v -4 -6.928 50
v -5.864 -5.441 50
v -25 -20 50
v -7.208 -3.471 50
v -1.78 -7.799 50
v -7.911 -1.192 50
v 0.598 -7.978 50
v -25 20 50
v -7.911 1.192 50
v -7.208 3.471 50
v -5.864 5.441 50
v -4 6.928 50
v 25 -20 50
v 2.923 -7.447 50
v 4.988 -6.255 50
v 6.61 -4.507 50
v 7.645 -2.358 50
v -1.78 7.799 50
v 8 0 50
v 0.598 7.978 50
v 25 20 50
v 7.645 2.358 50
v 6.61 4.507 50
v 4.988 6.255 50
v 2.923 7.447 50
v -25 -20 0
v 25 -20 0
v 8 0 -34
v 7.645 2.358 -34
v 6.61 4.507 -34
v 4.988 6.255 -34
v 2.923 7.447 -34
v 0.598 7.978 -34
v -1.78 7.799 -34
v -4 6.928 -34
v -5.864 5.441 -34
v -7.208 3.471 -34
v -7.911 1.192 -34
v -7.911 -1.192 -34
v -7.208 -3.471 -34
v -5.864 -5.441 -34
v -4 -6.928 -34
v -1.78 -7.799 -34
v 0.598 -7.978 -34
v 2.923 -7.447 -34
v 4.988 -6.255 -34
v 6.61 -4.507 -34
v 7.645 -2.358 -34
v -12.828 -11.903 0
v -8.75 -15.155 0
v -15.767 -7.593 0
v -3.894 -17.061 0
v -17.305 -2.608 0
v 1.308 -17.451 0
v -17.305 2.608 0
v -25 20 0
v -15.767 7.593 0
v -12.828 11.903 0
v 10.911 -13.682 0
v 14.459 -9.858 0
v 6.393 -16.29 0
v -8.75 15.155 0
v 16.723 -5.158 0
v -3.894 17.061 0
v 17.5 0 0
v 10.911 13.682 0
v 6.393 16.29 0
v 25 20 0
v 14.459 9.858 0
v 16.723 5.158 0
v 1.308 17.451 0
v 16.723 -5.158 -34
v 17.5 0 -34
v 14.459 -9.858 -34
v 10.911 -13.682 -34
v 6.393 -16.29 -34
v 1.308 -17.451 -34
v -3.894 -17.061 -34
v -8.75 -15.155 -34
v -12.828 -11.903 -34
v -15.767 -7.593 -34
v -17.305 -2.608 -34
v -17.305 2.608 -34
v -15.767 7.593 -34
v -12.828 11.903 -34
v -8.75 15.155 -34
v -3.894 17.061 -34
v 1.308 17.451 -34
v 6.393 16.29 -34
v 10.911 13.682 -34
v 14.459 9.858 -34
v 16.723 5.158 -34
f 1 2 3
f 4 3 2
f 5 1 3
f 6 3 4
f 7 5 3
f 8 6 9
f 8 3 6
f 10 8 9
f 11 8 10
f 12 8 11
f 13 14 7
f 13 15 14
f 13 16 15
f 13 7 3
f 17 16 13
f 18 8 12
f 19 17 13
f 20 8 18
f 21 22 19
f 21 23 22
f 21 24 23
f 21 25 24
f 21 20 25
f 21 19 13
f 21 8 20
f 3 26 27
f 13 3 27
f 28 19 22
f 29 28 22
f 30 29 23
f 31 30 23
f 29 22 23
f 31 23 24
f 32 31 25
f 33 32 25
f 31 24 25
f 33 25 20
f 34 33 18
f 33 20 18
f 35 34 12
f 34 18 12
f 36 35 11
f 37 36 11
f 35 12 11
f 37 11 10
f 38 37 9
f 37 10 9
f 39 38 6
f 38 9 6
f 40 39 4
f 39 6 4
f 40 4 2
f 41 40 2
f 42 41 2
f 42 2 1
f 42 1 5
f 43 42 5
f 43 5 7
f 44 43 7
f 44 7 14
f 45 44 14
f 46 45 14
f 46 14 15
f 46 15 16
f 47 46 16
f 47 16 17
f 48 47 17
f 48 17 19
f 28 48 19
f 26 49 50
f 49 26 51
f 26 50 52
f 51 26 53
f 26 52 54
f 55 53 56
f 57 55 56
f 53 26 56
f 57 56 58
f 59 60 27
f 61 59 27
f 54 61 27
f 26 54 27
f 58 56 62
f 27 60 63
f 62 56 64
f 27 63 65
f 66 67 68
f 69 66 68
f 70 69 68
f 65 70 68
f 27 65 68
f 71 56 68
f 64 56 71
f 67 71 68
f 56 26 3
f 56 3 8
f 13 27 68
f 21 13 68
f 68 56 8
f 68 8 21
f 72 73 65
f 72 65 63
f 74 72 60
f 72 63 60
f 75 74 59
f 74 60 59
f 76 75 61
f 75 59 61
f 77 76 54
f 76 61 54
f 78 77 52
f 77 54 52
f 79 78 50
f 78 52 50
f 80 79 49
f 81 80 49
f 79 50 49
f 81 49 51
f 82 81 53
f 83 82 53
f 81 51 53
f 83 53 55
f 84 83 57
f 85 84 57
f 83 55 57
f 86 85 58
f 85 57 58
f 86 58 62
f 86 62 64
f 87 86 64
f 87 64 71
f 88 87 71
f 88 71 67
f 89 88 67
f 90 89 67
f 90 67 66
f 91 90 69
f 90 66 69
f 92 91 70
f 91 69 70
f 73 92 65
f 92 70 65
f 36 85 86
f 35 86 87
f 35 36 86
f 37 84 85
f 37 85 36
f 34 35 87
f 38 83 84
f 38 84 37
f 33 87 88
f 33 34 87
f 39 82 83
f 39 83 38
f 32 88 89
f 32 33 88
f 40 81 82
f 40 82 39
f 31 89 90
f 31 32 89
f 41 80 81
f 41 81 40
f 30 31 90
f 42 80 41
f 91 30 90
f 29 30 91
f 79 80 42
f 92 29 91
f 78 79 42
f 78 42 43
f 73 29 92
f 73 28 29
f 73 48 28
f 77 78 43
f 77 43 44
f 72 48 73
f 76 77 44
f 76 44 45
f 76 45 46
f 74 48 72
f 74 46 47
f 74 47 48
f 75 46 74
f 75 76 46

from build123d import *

# Parameters (mm, degrees)
F0_W     = 50
F0_H     = 40
F1_DEPTH = 50
F2_R     = 17.5
F3_DEPTH = 34
F4_R     = 8
F5_DEPTH = 84.001


with BuildPart() as f1:
    # F0 (on Top) → F1 (new body)
    with BuildSketch(Plane.XY):
        Rectangle(F0_W, F0_H)
    extrude(amount=F1_DEPTH)

    # F2 (on face) → F3 (join)
    with BuildSketch(Plane(origin=(0, 0, 0), x_dir=(1, 0, 0), z_dir=(0, 0, -1))):
        Circle(F2_R)
    extrude(amount=F3_DEPTH)

    # F4 (on face) → F5 (cut, through all)
    with BuildSketch(Plane.XY.offset(50)):
        Circle(F4_R)
    extrude(amount=-F5_DEPTH, mode=Mode.SUBTRACT)


solid = f1.part
